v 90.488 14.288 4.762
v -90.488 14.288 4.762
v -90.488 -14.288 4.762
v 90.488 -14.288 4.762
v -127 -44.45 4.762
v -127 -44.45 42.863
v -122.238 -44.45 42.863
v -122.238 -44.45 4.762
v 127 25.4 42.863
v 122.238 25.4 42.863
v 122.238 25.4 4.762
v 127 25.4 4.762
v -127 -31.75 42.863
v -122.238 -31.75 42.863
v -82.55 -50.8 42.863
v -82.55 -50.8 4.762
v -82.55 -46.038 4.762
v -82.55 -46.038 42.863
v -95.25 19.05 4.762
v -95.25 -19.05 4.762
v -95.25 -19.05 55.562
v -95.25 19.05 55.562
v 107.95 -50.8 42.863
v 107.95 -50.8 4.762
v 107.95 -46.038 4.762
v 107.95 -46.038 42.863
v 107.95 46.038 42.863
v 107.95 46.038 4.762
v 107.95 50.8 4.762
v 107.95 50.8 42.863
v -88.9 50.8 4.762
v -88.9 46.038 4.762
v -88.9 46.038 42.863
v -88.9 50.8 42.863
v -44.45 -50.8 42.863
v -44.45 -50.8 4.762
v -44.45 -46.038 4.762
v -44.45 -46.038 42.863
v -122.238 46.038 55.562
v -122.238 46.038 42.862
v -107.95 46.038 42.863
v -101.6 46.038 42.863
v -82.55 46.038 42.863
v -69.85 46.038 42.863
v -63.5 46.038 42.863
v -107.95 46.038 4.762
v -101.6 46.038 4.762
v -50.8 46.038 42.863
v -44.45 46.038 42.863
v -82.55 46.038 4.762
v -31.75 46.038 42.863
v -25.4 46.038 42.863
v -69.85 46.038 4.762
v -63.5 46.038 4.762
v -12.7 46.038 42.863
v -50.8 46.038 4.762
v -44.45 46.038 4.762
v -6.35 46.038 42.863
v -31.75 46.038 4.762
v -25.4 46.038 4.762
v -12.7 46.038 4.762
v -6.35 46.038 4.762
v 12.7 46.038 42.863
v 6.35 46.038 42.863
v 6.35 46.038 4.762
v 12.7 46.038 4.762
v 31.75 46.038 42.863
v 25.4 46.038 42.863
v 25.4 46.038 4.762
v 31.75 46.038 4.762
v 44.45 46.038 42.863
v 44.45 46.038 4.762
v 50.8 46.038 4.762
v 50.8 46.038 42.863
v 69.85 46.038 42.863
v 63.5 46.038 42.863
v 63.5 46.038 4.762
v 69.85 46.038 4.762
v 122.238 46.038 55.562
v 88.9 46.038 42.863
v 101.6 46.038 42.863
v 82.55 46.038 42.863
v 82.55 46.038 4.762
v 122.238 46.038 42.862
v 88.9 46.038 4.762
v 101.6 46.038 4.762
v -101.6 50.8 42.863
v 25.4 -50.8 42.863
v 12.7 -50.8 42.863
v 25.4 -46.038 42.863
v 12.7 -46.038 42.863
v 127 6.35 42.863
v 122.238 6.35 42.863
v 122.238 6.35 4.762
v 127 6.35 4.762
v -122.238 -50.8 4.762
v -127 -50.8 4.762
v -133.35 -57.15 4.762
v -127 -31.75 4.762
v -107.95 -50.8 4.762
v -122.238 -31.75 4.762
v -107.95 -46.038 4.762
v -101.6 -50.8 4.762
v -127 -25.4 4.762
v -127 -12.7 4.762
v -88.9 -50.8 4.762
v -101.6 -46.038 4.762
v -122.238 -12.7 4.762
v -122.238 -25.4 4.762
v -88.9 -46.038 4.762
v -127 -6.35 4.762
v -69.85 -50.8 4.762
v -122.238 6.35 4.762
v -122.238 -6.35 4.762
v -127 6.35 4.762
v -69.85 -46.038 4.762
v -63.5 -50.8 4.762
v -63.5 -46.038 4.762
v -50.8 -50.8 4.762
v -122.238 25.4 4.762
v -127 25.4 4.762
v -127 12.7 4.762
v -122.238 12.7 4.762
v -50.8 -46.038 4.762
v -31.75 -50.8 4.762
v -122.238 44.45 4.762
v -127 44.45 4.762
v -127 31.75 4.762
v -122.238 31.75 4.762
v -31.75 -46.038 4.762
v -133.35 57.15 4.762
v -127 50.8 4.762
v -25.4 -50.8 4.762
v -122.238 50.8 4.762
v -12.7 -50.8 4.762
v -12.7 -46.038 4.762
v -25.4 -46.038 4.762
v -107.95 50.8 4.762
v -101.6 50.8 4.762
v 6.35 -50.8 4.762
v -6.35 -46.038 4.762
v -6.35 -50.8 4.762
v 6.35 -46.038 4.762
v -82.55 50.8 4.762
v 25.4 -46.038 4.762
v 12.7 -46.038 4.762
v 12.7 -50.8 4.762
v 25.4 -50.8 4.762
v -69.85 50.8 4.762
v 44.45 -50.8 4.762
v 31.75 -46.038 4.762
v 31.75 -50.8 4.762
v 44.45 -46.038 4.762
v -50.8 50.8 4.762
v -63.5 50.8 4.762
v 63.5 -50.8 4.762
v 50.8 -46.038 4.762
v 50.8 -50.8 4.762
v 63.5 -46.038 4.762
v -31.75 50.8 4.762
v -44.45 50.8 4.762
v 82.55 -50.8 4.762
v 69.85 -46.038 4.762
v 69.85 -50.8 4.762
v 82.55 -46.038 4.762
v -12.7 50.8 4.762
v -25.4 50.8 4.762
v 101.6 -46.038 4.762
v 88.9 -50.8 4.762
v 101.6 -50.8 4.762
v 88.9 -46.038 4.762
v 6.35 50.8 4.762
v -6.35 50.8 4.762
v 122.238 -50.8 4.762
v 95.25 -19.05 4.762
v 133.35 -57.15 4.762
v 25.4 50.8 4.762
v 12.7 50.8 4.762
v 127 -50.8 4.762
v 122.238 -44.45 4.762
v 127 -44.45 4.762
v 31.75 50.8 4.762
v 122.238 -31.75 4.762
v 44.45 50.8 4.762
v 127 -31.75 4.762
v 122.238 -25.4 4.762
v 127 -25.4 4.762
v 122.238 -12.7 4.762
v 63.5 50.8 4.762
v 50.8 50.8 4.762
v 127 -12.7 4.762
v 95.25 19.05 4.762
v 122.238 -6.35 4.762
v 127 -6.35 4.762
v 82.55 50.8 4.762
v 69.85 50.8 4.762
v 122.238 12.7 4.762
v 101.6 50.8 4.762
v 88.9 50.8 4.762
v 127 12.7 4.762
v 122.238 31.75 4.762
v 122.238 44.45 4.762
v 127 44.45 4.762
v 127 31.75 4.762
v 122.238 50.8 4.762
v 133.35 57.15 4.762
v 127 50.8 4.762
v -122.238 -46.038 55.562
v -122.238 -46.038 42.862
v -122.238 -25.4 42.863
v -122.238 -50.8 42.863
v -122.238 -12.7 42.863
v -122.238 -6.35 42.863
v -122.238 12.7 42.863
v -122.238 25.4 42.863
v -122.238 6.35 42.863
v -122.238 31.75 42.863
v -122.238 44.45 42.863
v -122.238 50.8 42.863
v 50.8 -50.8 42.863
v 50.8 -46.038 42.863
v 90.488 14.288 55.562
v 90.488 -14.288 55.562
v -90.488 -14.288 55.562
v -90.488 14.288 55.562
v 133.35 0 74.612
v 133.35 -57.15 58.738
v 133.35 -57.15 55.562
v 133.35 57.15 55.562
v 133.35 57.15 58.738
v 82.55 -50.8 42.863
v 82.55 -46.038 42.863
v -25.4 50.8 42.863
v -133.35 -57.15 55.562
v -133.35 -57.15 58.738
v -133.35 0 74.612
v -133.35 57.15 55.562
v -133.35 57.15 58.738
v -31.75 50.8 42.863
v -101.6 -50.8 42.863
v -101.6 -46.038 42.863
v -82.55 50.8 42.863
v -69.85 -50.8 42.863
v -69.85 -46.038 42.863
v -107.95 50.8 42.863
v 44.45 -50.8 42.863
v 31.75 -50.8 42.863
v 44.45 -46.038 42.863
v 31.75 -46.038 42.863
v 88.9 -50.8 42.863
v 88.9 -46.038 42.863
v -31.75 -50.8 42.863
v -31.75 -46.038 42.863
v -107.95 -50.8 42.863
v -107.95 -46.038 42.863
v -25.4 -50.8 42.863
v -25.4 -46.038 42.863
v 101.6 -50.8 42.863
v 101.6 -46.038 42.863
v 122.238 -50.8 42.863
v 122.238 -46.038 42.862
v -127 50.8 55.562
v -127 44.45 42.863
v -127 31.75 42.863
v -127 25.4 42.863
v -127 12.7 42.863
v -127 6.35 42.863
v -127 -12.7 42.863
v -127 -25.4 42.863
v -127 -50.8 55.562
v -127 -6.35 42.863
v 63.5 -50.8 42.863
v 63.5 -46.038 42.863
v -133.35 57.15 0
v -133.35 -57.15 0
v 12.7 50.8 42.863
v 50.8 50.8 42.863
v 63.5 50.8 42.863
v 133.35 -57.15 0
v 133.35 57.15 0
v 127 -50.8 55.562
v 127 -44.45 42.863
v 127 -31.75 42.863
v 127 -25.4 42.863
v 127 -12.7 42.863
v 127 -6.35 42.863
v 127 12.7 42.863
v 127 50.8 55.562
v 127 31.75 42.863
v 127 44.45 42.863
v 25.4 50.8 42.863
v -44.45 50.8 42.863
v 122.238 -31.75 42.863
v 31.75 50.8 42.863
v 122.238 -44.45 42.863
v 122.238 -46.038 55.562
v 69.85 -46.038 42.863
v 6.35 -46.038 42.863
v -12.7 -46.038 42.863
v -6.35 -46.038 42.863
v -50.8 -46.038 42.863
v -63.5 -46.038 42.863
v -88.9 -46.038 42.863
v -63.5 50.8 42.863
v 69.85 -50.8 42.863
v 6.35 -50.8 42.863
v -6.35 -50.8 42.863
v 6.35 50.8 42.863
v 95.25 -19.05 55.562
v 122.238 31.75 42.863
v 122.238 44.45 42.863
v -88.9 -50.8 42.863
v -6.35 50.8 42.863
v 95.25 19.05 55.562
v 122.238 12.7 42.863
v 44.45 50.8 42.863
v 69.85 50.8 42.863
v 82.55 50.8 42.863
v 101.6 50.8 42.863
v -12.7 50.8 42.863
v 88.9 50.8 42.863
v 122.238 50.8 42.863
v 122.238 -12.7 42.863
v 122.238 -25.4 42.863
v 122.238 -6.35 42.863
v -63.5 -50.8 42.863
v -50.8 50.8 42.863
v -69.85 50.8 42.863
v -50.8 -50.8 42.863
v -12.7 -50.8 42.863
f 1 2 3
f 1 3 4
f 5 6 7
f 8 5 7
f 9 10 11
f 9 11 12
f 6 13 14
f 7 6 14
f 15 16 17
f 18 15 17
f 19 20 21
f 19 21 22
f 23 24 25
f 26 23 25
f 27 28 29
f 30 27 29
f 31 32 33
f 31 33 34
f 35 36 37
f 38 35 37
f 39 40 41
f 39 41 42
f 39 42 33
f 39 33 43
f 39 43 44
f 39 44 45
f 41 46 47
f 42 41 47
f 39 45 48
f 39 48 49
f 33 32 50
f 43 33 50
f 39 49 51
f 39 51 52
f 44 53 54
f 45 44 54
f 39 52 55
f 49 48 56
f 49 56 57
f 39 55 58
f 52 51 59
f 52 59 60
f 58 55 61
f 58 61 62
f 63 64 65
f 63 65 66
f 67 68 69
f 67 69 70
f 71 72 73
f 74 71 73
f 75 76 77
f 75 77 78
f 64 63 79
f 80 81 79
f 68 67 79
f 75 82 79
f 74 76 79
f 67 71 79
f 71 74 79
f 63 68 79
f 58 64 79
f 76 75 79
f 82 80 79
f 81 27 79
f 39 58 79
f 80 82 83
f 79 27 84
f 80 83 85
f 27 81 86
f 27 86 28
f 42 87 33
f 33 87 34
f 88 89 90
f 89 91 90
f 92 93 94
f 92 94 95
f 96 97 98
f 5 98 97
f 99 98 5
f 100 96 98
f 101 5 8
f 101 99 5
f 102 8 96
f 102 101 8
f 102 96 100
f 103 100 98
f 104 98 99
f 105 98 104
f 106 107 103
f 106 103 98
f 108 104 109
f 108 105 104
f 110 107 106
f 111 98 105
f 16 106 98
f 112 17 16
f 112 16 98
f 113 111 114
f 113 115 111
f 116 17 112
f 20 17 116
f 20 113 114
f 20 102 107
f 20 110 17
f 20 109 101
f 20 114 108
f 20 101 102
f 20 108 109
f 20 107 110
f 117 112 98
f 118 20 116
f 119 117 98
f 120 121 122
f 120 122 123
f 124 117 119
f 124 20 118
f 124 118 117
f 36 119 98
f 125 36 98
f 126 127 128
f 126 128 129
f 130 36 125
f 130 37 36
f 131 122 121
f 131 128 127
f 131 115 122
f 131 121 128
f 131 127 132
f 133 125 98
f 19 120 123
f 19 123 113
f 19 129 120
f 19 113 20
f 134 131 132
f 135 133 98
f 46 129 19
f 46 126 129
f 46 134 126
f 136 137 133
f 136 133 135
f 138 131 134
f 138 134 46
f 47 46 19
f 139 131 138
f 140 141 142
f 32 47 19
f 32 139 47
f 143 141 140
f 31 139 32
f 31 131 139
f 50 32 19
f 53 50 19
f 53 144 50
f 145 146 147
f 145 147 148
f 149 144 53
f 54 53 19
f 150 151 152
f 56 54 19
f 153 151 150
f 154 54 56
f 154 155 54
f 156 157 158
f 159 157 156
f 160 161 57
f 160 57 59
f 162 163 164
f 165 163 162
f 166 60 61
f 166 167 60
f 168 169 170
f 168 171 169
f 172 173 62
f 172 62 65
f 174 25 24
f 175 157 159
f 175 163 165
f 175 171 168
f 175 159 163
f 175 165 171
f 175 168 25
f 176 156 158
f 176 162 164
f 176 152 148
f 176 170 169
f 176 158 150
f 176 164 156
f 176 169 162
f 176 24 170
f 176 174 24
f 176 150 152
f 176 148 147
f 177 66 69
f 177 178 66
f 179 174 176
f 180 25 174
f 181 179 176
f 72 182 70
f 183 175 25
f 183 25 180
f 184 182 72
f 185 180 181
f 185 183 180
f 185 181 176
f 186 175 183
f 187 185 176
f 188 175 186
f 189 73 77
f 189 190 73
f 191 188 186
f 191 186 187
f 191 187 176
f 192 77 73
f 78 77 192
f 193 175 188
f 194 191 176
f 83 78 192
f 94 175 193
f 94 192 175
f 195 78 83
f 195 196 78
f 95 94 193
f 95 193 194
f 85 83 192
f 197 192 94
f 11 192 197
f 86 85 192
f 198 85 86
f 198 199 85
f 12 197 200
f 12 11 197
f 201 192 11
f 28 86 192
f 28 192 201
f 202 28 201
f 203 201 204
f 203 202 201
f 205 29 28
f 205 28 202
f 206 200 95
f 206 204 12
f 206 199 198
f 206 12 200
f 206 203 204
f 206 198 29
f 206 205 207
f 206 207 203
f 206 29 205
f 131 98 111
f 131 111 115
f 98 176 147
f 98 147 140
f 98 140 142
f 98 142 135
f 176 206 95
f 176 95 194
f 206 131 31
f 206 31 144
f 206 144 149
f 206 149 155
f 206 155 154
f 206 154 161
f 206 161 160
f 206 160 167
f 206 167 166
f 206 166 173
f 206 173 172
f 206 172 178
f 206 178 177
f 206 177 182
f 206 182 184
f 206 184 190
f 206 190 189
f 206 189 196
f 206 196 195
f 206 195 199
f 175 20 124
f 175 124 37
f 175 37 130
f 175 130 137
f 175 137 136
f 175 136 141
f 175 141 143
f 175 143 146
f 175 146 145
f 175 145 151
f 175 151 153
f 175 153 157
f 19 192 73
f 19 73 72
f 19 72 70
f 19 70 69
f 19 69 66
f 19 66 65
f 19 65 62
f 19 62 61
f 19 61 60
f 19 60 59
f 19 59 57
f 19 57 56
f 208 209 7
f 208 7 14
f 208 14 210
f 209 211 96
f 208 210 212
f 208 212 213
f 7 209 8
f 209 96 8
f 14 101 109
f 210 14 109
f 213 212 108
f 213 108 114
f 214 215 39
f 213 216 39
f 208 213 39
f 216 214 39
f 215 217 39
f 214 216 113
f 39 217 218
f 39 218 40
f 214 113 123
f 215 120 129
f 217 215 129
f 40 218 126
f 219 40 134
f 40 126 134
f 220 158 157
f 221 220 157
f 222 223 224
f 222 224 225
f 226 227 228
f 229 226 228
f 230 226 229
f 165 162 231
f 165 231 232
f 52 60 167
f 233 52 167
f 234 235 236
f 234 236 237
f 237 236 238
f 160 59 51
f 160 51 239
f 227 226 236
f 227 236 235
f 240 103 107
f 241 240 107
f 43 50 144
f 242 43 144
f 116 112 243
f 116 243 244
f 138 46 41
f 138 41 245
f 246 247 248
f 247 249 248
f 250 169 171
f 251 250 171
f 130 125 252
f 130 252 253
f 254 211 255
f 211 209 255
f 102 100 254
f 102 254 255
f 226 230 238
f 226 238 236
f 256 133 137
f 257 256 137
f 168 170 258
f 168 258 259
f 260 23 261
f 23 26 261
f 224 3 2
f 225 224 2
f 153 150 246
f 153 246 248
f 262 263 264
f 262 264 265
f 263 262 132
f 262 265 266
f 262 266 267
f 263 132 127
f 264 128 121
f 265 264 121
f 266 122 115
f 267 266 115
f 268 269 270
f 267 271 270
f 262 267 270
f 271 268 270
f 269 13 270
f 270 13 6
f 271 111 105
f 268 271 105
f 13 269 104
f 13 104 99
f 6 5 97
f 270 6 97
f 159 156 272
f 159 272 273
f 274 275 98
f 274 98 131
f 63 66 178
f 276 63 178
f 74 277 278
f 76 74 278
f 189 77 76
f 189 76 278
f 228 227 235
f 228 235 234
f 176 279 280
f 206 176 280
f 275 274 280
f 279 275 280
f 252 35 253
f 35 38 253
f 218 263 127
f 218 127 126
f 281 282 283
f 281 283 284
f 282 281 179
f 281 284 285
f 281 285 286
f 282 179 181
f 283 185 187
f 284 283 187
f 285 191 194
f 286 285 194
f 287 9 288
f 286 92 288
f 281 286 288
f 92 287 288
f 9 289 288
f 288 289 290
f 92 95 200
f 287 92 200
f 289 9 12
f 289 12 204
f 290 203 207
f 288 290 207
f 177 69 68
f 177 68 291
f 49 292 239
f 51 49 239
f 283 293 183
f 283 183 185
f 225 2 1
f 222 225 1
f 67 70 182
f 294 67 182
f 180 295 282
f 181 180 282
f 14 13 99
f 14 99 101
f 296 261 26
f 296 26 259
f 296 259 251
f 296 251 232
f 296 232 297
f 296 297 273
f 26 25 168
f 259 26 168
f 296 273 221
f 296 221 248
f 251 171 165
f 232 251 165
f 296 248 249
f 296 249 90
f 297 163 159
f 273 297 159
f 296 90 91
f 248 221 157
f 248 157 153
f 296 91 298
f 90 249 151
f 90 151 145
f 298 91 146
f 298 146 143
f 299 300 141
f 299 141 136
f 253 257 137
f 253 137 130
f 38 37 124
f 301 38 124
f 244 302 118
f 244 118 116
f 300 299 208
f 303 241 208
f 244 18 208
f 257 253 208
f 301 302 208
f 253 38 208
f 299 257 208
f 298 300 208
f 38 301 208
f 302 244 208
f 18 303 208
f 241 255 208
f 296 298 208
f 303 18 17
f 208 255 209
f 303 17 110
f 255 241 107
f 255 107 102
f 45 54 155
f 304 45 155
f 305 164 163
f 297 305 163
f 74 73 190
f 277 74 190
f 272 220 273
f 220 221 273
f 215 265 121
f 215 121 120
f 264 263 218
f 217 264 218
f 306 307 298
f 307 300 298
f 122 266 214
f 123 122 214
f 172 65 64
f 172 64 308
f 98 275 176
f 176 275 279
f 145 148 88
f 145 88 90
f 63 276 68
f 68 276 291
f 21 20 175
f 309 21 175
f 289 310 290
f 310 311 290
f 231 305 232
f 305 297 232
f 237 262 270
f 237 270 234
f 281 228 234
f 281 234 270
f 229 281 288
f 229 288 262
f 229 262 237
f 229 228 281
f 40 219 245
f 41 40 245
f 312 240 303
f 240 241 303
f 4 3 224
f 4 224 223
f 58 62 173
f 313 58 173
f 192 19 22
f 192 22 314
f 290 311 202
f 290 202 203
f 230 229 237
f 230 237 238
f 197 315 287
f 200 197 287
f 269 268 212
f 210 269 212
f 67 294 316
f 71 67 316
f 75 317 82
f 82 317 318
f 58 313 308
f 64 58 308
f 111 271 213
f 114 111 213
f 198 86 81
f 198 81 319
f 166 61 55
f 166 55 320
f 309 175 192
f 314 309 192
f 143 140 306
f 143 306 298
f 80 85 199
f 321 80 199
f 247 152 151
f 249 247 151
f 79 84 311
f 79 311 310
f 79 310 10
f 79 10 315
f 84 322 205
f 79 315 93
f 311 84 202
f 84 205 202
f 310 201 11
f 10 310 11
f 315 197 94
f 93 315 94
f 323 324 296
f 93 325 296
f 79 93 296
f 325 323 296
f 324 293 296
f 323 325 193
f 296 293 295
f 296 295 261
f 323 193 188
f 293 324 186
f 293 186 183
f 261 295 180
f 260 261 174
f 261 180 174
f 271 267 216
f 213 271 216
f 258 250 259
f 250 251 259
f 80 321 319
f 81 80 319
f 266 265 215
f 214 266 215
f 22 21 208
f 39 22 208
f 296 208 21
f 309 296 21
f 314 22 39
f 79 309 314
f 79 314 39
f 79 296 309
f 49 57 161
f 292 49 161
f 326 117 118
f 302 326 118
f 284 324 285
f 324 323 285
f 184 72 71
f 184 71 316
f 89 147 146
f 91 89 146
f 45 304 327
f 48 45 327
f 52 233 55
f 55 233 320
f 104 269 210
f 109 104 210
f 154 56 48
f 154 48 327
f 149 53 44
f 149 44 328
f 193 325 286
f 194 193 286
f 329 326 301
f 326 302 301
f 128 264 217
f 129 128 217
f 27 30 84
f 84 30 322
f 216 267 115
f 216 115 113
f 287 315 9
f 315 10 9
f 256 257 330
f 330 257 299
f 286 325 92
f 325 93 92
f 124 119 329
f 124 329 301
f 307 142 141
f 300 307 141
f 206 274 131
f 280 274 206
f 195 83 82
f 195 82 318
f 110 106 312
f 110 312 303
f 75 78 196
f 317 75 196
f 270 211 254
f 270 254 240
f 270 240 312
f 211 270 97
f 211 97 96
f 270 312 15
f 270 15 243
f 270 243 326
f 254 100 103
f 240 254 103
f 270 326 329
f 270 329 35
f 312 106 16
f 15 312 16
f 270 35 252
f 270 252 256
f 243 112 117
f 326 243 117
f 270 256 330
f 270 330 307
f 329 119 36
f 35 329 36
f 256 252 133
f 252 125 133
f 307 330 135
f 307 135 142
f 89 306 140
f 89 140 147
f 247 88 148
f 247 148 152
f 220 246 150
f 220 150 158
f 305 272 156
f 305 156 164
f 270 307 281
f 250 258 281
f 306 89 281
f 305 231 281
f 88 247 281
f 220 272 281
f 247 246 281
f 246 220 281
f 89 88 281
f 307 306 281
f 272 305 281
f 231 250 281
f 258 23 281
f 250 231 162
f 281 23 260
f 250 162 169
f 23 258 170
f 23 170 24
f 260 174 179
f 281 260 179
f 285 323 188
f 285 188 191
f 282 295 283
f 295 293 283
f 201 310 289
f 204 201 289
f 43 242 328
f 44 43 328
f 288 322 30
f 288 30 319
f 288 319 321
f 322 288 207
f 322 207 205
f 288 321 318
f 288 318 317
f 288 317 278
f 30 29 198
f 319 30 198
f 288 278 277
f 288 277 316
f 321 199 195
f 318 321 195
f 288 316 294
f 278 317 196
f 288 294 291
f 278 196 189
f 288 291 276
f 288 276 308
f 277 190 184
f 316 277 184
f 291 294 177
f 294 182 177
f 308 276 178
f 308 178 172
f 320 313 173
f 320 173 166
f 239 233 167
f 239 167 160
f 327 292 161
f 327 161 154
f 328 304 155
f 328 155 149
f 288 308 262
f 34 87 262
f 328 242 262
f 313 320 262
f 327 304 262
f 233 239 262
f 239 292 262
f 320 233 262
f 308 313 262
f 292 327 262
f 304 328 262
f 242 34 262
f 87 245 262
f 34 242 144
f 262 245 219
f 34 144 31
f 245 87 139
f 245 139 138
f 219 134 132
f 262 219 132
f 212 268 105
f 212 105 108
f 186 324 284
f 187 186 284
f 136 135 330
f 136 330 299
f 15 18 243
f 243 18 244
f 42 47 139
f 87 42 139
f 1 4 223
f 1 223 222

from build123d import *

# Parameters (mm, degrees)
F0_W     = 266.7
F0_H     = 114.3
F1_DEPTH = 4.7625
F2_W     = 4.7625
F2_H     = 6.35
F2_W_2   = 6.35
F2_H_2   = 4.7625
F3_DEPTH = 38.1
F5_DEPTH = 12.7
F6_W     = 4.7625
F6_H     = 6.35
F6_W_2   = 6.35
F6_H_2   = 4.7625
F6_W_3   = 190.5
F6_H_3   = 38.1
F6_W_4   = 180.975
F6_H_4   = 28.575
F7_DEPTH = 50.8
F9_DEPTH = 266.7


with BuildPart() as f1:
    # F0 (on Top) → F1 (new body)
    with BuildSketch(Plane.XY):
        Rectangle(F0_W, F0_H)
    extrude(amount=F1_DEPTH)

    # F2 (on face) → F3 (join)
    with BuildSketch(Plane.XY.offset(4.7625)):
        with Locations((124.61875, -47.625)):
            Rectangle(F2_W, F2_H)
        with Locations((124.61875, 9.525)):
            Rectangle(F2_W, F2_H)
        with Locations((124.61875, 28.575)):
            Rectangle(F2_W, F2_H)
        with Locations((124.61875, -9.525)):
            Rectangle(F2_W, F2_H)
        with Locations((124.61875, -28.575)):
            Rectangle(F2_W, F2_H)
        with Locations((-124.61875, 47.625)):
            Rectangle(F2_W, F2_H)
        with Locations((-104.775, 48.41875)):
            Rectangle(F2_W_2, F2_H_2)
        with Locations((-85.725, 48.41875)):
            Rectangle(F2_W_2, F2_H_2)
        with Locations((-66.675, 48.41875)):
            Rectangle(F2_W_2, F2_H_2)
        with Locations((-47.625, 48.41875)):
            Rectangle(F2_W_2, F2_H_2)
        with Locations((-28.575, 48.41875)):
            Rectangle(F2_W_2, F2_H_2)
        with Locations((9.525, 48.41875)):
            Rectangle(F2_W_2, F2_H_2)
        with Locations((28.575, 48.41875)):
            Rectangle(F2_W_2, F2_H_2)
        with Locations((47.625, 48.41875)):
            Rectangle(F2_W_2, F2_H_2)
        with Locations((66.675, 48.41875)):
            Rectangle(F2_W_2, F2_H_2)
        with Locations((85.725, 48.41875)):
            Rectangle(F2_W_2, F2_H_2)
        with Locations((104.775, 48.41875)):
            Rectangle(F2_W_2, F2_H_2)
        with Locations((124.61875, 47.625)):
            Rectangle(F2_W, F2_H)
        with Locations((-9.525, 48.41875)):
            Rectangle(F2_W_2, F2_H_2)
        with Locations((-124.61875, 28.575)):
            Rectangle(F2_W, F2_H)
        with Locations((-124.61875, 9.525)):
            Rectangle(F2_W, F2_H)
        with Locations((-124.61875, -9.525)):
            Rectangle(F2_W, F2_H)
        with Locations((-124.61875, -47.625)):
            Rectangle(F2_W, F2_H)
        with Locations((-104.775, -48.41875)):
            Rectangle(F2_W_2, F2_H_2)
        with Locations((-85.725, -48.41875)):
            Rectangle(F2_W_2, F2_H_2)
        with Locations((-124.61875, -28.575)):
            Rectangle(F2_W, F2_H)
        with Locations((-66.675, -48.41875)):
            Rectangle(F2_W_2, F2_H_2)
        with Locations((-47.625, -48.41875)):
            Rectangle(F2_W_2, F2_H_2)
        with Locations((-28.575, -48.41875)):
            Rectangle(F2_W_2, F2_H_2)
        with Locations((-9.525, -48.41875)):
            Rectangle(F2_W_2, F2_H_2)
        with Locations((9.525, -48.41875)):
            Rectangle(F2_W_2, F2_H_2)
        with Locations((28.575, -48.41875)):
            Rectangle(F2_W_2, F2_H_2)
        with Locations((47.625, -48.41875)):
            Rectangle(F2_W_2, F2_H_2)
        with Locations((66.675, -48.41875)):
            Rectangle(F2_W_2, F2_H_2)
        with Locations((85.725, -48.41875)):
            Rectangle(F2_W_2, F2_H_2)
        with Locations((104.775, -48.41875)):
            Rectangle(F2_W_2, F2_H_2)
    extrude(amount=F3_DEPTH)

    # F4 (on face) → F5 (join)
    with BuildSketch(Plane.XY.offset(42.8625)):
        Polygon((127, -50.8), (127, 50.8), (122.2375, 50.8), (122.2375, 46.0375), (122.2375, 44.45), (122.2375, -46.0375), (-122.2375, -46.0375), (-122.2375, -50.8), align=None)
        Polygon((122.2375, 46.0375), (122.2375, 50.8), (-127, 50.8), (-127, -50.8), (-122.2375, -50.8), (-122.2375, -46.0375), (-122.2375, -44.45), (-122.2375, 46.0375), align=None)
    extrude(amount=F5_DEPTH)

    # F6 (on face) → F7 (join)
    with BuildSketch(Plane.XY.offset(4.7625)):
        with Locations((124.61875, 28.575)):
            Rectangle(F6_W, F6_H)
        with Locations((124.61875, 9.525)):
            Rectangle(F6_W, F6_H)
        with Locations((124.61875, -9.525)):
            Rectangle(F6_W, F6_H)
        with Locations((124.61875, -28.575)):
            Rectangle(F6_W, F6_H)
        with Locations((124.61875, 47.625)):
            Rectangle(F6_W, F6_H)
        with Locations((124.61875, -47.625)):
            Rectangle(F6_W, F6_H)
        with Locations((-124.61875, -47.625)):
            Rectangle(F6_W, F6_H)
        with Locations((9.525, -48.41875)):
            Rectangle(F6_W_2, F6_H_2)
        with Locations((-66.675, -48.41875)):
            Rectangle(F6_W_2, F6_H_2)
        with Locations((47.625, -48.41875)):
            Rectangle(F6_W_2, F6_H_2)
        with Locations((-28.575, -48.41875)):
            Rectangle(F6_W_2, F6_H_2)
        with Locations((-104.775, -48.41875)):
            Rectangle(F6_W_2, F6_H_2)
        with Locations((-85.725, -48.41875)):
            Rectangle(F6_W_2, F6_H_2)
        with Locations((-9.525, -48.41875)):
            Rectangle(F6_W_2, F6_H_2)
        with Locations((66.675, -48.41875)):
            Rectangle(F6_W_2, F6_H_2)
        with Locations((85.725, -48.41875)):
            Rectangle(F6_W_2, F6_H_2)
        with Locations((104.775, -48.41875)):
            Rectangle(F6_W_2, F6_H_2)
        with Locations((-47.625, -48.41875)):
            Rectangle(F6_W_2, F6_H_2)
        with Locations((28.575, -48.41875)):
            Rectangle(F6_W_2, F6_H_2)
        with Locations((-124.61875, 28.575)):
            Rectangle(F6_W, F6_H)
        with Locations((-124.61875, 9.525)):
            Rectangle(F6_W, F6_H)
        with Locations((-124.61875, -9.525)):
            Rectangle(F6_W, F6_H)
        with Locations((-124.61875, -28.575)):
            Rectangle(F6_W, F6_H)
        with Locations((-124.61875, 47.625)):
            Rectangle(F6_W, F6_H)
        with Locations((104.775, 48.41875)):
            Rectangle(F6_W_2, F6_H_2)
        with Locations((47.625, 48.41875)):
            Rectangle(F6_W_2, F6_H_2)
        with Locations((85.725, 48.41875)):
            Rectangle(F6_W_2, F6_H_2)
        with Locations((66.675, 48.41875)):
            Rectangle(F6_W_2, F6_H_2)
        with Locations((28.575, 48.41875)):
            Rectangle(F6_W_2, F6_H_2)
        with Locations((9.525, 48.41875)):
            Rectangle(F6_W_2, F6_H_2)
        with Locations((-9.525, 48.41875)):
            Rectangle(F6_W_2, F6_H_2)
        with Locations((-28.575, 48.41875)):
            Rectangle(F6_W_2, F6_H_2)
        with Locations((-47.625, 48.41875)):
            Rectangle(F6_W_2, F6_H_2)
        with Locations((-66.675, 48.41875)):
            Rectangle(F6_W_2, F6_H_2)
        with Locations((-85.725, 48.41875)):
            Rectangle(F6_W_2, F6_H_2)
        with Locations((-104.775, 48.41875)):
            Rectangle(F6_W_2, F6_H_2)
        Rectangle(F6_W_3, F6_H_3)
        Rectangle(F6_W_4, F6_H_4, mode=Mode.SUBTRACT)
    extrude(amount=F7_DEPTH)

    # F8 (on face) → F9 (join, through all)
    with BuildSketch(Plane.YZ.offset(133.35)):
        Polygon((-57.15, 55.5625), (-50.8, 55.5625), (50.8, 55.5625), (57.15, 55.5625), (57.15, 58.7375), (0, 74.6125), (-57.15, 58.7375), align=None)
    extrude(amount=-F9_DEPTH)


solid = f1.part
